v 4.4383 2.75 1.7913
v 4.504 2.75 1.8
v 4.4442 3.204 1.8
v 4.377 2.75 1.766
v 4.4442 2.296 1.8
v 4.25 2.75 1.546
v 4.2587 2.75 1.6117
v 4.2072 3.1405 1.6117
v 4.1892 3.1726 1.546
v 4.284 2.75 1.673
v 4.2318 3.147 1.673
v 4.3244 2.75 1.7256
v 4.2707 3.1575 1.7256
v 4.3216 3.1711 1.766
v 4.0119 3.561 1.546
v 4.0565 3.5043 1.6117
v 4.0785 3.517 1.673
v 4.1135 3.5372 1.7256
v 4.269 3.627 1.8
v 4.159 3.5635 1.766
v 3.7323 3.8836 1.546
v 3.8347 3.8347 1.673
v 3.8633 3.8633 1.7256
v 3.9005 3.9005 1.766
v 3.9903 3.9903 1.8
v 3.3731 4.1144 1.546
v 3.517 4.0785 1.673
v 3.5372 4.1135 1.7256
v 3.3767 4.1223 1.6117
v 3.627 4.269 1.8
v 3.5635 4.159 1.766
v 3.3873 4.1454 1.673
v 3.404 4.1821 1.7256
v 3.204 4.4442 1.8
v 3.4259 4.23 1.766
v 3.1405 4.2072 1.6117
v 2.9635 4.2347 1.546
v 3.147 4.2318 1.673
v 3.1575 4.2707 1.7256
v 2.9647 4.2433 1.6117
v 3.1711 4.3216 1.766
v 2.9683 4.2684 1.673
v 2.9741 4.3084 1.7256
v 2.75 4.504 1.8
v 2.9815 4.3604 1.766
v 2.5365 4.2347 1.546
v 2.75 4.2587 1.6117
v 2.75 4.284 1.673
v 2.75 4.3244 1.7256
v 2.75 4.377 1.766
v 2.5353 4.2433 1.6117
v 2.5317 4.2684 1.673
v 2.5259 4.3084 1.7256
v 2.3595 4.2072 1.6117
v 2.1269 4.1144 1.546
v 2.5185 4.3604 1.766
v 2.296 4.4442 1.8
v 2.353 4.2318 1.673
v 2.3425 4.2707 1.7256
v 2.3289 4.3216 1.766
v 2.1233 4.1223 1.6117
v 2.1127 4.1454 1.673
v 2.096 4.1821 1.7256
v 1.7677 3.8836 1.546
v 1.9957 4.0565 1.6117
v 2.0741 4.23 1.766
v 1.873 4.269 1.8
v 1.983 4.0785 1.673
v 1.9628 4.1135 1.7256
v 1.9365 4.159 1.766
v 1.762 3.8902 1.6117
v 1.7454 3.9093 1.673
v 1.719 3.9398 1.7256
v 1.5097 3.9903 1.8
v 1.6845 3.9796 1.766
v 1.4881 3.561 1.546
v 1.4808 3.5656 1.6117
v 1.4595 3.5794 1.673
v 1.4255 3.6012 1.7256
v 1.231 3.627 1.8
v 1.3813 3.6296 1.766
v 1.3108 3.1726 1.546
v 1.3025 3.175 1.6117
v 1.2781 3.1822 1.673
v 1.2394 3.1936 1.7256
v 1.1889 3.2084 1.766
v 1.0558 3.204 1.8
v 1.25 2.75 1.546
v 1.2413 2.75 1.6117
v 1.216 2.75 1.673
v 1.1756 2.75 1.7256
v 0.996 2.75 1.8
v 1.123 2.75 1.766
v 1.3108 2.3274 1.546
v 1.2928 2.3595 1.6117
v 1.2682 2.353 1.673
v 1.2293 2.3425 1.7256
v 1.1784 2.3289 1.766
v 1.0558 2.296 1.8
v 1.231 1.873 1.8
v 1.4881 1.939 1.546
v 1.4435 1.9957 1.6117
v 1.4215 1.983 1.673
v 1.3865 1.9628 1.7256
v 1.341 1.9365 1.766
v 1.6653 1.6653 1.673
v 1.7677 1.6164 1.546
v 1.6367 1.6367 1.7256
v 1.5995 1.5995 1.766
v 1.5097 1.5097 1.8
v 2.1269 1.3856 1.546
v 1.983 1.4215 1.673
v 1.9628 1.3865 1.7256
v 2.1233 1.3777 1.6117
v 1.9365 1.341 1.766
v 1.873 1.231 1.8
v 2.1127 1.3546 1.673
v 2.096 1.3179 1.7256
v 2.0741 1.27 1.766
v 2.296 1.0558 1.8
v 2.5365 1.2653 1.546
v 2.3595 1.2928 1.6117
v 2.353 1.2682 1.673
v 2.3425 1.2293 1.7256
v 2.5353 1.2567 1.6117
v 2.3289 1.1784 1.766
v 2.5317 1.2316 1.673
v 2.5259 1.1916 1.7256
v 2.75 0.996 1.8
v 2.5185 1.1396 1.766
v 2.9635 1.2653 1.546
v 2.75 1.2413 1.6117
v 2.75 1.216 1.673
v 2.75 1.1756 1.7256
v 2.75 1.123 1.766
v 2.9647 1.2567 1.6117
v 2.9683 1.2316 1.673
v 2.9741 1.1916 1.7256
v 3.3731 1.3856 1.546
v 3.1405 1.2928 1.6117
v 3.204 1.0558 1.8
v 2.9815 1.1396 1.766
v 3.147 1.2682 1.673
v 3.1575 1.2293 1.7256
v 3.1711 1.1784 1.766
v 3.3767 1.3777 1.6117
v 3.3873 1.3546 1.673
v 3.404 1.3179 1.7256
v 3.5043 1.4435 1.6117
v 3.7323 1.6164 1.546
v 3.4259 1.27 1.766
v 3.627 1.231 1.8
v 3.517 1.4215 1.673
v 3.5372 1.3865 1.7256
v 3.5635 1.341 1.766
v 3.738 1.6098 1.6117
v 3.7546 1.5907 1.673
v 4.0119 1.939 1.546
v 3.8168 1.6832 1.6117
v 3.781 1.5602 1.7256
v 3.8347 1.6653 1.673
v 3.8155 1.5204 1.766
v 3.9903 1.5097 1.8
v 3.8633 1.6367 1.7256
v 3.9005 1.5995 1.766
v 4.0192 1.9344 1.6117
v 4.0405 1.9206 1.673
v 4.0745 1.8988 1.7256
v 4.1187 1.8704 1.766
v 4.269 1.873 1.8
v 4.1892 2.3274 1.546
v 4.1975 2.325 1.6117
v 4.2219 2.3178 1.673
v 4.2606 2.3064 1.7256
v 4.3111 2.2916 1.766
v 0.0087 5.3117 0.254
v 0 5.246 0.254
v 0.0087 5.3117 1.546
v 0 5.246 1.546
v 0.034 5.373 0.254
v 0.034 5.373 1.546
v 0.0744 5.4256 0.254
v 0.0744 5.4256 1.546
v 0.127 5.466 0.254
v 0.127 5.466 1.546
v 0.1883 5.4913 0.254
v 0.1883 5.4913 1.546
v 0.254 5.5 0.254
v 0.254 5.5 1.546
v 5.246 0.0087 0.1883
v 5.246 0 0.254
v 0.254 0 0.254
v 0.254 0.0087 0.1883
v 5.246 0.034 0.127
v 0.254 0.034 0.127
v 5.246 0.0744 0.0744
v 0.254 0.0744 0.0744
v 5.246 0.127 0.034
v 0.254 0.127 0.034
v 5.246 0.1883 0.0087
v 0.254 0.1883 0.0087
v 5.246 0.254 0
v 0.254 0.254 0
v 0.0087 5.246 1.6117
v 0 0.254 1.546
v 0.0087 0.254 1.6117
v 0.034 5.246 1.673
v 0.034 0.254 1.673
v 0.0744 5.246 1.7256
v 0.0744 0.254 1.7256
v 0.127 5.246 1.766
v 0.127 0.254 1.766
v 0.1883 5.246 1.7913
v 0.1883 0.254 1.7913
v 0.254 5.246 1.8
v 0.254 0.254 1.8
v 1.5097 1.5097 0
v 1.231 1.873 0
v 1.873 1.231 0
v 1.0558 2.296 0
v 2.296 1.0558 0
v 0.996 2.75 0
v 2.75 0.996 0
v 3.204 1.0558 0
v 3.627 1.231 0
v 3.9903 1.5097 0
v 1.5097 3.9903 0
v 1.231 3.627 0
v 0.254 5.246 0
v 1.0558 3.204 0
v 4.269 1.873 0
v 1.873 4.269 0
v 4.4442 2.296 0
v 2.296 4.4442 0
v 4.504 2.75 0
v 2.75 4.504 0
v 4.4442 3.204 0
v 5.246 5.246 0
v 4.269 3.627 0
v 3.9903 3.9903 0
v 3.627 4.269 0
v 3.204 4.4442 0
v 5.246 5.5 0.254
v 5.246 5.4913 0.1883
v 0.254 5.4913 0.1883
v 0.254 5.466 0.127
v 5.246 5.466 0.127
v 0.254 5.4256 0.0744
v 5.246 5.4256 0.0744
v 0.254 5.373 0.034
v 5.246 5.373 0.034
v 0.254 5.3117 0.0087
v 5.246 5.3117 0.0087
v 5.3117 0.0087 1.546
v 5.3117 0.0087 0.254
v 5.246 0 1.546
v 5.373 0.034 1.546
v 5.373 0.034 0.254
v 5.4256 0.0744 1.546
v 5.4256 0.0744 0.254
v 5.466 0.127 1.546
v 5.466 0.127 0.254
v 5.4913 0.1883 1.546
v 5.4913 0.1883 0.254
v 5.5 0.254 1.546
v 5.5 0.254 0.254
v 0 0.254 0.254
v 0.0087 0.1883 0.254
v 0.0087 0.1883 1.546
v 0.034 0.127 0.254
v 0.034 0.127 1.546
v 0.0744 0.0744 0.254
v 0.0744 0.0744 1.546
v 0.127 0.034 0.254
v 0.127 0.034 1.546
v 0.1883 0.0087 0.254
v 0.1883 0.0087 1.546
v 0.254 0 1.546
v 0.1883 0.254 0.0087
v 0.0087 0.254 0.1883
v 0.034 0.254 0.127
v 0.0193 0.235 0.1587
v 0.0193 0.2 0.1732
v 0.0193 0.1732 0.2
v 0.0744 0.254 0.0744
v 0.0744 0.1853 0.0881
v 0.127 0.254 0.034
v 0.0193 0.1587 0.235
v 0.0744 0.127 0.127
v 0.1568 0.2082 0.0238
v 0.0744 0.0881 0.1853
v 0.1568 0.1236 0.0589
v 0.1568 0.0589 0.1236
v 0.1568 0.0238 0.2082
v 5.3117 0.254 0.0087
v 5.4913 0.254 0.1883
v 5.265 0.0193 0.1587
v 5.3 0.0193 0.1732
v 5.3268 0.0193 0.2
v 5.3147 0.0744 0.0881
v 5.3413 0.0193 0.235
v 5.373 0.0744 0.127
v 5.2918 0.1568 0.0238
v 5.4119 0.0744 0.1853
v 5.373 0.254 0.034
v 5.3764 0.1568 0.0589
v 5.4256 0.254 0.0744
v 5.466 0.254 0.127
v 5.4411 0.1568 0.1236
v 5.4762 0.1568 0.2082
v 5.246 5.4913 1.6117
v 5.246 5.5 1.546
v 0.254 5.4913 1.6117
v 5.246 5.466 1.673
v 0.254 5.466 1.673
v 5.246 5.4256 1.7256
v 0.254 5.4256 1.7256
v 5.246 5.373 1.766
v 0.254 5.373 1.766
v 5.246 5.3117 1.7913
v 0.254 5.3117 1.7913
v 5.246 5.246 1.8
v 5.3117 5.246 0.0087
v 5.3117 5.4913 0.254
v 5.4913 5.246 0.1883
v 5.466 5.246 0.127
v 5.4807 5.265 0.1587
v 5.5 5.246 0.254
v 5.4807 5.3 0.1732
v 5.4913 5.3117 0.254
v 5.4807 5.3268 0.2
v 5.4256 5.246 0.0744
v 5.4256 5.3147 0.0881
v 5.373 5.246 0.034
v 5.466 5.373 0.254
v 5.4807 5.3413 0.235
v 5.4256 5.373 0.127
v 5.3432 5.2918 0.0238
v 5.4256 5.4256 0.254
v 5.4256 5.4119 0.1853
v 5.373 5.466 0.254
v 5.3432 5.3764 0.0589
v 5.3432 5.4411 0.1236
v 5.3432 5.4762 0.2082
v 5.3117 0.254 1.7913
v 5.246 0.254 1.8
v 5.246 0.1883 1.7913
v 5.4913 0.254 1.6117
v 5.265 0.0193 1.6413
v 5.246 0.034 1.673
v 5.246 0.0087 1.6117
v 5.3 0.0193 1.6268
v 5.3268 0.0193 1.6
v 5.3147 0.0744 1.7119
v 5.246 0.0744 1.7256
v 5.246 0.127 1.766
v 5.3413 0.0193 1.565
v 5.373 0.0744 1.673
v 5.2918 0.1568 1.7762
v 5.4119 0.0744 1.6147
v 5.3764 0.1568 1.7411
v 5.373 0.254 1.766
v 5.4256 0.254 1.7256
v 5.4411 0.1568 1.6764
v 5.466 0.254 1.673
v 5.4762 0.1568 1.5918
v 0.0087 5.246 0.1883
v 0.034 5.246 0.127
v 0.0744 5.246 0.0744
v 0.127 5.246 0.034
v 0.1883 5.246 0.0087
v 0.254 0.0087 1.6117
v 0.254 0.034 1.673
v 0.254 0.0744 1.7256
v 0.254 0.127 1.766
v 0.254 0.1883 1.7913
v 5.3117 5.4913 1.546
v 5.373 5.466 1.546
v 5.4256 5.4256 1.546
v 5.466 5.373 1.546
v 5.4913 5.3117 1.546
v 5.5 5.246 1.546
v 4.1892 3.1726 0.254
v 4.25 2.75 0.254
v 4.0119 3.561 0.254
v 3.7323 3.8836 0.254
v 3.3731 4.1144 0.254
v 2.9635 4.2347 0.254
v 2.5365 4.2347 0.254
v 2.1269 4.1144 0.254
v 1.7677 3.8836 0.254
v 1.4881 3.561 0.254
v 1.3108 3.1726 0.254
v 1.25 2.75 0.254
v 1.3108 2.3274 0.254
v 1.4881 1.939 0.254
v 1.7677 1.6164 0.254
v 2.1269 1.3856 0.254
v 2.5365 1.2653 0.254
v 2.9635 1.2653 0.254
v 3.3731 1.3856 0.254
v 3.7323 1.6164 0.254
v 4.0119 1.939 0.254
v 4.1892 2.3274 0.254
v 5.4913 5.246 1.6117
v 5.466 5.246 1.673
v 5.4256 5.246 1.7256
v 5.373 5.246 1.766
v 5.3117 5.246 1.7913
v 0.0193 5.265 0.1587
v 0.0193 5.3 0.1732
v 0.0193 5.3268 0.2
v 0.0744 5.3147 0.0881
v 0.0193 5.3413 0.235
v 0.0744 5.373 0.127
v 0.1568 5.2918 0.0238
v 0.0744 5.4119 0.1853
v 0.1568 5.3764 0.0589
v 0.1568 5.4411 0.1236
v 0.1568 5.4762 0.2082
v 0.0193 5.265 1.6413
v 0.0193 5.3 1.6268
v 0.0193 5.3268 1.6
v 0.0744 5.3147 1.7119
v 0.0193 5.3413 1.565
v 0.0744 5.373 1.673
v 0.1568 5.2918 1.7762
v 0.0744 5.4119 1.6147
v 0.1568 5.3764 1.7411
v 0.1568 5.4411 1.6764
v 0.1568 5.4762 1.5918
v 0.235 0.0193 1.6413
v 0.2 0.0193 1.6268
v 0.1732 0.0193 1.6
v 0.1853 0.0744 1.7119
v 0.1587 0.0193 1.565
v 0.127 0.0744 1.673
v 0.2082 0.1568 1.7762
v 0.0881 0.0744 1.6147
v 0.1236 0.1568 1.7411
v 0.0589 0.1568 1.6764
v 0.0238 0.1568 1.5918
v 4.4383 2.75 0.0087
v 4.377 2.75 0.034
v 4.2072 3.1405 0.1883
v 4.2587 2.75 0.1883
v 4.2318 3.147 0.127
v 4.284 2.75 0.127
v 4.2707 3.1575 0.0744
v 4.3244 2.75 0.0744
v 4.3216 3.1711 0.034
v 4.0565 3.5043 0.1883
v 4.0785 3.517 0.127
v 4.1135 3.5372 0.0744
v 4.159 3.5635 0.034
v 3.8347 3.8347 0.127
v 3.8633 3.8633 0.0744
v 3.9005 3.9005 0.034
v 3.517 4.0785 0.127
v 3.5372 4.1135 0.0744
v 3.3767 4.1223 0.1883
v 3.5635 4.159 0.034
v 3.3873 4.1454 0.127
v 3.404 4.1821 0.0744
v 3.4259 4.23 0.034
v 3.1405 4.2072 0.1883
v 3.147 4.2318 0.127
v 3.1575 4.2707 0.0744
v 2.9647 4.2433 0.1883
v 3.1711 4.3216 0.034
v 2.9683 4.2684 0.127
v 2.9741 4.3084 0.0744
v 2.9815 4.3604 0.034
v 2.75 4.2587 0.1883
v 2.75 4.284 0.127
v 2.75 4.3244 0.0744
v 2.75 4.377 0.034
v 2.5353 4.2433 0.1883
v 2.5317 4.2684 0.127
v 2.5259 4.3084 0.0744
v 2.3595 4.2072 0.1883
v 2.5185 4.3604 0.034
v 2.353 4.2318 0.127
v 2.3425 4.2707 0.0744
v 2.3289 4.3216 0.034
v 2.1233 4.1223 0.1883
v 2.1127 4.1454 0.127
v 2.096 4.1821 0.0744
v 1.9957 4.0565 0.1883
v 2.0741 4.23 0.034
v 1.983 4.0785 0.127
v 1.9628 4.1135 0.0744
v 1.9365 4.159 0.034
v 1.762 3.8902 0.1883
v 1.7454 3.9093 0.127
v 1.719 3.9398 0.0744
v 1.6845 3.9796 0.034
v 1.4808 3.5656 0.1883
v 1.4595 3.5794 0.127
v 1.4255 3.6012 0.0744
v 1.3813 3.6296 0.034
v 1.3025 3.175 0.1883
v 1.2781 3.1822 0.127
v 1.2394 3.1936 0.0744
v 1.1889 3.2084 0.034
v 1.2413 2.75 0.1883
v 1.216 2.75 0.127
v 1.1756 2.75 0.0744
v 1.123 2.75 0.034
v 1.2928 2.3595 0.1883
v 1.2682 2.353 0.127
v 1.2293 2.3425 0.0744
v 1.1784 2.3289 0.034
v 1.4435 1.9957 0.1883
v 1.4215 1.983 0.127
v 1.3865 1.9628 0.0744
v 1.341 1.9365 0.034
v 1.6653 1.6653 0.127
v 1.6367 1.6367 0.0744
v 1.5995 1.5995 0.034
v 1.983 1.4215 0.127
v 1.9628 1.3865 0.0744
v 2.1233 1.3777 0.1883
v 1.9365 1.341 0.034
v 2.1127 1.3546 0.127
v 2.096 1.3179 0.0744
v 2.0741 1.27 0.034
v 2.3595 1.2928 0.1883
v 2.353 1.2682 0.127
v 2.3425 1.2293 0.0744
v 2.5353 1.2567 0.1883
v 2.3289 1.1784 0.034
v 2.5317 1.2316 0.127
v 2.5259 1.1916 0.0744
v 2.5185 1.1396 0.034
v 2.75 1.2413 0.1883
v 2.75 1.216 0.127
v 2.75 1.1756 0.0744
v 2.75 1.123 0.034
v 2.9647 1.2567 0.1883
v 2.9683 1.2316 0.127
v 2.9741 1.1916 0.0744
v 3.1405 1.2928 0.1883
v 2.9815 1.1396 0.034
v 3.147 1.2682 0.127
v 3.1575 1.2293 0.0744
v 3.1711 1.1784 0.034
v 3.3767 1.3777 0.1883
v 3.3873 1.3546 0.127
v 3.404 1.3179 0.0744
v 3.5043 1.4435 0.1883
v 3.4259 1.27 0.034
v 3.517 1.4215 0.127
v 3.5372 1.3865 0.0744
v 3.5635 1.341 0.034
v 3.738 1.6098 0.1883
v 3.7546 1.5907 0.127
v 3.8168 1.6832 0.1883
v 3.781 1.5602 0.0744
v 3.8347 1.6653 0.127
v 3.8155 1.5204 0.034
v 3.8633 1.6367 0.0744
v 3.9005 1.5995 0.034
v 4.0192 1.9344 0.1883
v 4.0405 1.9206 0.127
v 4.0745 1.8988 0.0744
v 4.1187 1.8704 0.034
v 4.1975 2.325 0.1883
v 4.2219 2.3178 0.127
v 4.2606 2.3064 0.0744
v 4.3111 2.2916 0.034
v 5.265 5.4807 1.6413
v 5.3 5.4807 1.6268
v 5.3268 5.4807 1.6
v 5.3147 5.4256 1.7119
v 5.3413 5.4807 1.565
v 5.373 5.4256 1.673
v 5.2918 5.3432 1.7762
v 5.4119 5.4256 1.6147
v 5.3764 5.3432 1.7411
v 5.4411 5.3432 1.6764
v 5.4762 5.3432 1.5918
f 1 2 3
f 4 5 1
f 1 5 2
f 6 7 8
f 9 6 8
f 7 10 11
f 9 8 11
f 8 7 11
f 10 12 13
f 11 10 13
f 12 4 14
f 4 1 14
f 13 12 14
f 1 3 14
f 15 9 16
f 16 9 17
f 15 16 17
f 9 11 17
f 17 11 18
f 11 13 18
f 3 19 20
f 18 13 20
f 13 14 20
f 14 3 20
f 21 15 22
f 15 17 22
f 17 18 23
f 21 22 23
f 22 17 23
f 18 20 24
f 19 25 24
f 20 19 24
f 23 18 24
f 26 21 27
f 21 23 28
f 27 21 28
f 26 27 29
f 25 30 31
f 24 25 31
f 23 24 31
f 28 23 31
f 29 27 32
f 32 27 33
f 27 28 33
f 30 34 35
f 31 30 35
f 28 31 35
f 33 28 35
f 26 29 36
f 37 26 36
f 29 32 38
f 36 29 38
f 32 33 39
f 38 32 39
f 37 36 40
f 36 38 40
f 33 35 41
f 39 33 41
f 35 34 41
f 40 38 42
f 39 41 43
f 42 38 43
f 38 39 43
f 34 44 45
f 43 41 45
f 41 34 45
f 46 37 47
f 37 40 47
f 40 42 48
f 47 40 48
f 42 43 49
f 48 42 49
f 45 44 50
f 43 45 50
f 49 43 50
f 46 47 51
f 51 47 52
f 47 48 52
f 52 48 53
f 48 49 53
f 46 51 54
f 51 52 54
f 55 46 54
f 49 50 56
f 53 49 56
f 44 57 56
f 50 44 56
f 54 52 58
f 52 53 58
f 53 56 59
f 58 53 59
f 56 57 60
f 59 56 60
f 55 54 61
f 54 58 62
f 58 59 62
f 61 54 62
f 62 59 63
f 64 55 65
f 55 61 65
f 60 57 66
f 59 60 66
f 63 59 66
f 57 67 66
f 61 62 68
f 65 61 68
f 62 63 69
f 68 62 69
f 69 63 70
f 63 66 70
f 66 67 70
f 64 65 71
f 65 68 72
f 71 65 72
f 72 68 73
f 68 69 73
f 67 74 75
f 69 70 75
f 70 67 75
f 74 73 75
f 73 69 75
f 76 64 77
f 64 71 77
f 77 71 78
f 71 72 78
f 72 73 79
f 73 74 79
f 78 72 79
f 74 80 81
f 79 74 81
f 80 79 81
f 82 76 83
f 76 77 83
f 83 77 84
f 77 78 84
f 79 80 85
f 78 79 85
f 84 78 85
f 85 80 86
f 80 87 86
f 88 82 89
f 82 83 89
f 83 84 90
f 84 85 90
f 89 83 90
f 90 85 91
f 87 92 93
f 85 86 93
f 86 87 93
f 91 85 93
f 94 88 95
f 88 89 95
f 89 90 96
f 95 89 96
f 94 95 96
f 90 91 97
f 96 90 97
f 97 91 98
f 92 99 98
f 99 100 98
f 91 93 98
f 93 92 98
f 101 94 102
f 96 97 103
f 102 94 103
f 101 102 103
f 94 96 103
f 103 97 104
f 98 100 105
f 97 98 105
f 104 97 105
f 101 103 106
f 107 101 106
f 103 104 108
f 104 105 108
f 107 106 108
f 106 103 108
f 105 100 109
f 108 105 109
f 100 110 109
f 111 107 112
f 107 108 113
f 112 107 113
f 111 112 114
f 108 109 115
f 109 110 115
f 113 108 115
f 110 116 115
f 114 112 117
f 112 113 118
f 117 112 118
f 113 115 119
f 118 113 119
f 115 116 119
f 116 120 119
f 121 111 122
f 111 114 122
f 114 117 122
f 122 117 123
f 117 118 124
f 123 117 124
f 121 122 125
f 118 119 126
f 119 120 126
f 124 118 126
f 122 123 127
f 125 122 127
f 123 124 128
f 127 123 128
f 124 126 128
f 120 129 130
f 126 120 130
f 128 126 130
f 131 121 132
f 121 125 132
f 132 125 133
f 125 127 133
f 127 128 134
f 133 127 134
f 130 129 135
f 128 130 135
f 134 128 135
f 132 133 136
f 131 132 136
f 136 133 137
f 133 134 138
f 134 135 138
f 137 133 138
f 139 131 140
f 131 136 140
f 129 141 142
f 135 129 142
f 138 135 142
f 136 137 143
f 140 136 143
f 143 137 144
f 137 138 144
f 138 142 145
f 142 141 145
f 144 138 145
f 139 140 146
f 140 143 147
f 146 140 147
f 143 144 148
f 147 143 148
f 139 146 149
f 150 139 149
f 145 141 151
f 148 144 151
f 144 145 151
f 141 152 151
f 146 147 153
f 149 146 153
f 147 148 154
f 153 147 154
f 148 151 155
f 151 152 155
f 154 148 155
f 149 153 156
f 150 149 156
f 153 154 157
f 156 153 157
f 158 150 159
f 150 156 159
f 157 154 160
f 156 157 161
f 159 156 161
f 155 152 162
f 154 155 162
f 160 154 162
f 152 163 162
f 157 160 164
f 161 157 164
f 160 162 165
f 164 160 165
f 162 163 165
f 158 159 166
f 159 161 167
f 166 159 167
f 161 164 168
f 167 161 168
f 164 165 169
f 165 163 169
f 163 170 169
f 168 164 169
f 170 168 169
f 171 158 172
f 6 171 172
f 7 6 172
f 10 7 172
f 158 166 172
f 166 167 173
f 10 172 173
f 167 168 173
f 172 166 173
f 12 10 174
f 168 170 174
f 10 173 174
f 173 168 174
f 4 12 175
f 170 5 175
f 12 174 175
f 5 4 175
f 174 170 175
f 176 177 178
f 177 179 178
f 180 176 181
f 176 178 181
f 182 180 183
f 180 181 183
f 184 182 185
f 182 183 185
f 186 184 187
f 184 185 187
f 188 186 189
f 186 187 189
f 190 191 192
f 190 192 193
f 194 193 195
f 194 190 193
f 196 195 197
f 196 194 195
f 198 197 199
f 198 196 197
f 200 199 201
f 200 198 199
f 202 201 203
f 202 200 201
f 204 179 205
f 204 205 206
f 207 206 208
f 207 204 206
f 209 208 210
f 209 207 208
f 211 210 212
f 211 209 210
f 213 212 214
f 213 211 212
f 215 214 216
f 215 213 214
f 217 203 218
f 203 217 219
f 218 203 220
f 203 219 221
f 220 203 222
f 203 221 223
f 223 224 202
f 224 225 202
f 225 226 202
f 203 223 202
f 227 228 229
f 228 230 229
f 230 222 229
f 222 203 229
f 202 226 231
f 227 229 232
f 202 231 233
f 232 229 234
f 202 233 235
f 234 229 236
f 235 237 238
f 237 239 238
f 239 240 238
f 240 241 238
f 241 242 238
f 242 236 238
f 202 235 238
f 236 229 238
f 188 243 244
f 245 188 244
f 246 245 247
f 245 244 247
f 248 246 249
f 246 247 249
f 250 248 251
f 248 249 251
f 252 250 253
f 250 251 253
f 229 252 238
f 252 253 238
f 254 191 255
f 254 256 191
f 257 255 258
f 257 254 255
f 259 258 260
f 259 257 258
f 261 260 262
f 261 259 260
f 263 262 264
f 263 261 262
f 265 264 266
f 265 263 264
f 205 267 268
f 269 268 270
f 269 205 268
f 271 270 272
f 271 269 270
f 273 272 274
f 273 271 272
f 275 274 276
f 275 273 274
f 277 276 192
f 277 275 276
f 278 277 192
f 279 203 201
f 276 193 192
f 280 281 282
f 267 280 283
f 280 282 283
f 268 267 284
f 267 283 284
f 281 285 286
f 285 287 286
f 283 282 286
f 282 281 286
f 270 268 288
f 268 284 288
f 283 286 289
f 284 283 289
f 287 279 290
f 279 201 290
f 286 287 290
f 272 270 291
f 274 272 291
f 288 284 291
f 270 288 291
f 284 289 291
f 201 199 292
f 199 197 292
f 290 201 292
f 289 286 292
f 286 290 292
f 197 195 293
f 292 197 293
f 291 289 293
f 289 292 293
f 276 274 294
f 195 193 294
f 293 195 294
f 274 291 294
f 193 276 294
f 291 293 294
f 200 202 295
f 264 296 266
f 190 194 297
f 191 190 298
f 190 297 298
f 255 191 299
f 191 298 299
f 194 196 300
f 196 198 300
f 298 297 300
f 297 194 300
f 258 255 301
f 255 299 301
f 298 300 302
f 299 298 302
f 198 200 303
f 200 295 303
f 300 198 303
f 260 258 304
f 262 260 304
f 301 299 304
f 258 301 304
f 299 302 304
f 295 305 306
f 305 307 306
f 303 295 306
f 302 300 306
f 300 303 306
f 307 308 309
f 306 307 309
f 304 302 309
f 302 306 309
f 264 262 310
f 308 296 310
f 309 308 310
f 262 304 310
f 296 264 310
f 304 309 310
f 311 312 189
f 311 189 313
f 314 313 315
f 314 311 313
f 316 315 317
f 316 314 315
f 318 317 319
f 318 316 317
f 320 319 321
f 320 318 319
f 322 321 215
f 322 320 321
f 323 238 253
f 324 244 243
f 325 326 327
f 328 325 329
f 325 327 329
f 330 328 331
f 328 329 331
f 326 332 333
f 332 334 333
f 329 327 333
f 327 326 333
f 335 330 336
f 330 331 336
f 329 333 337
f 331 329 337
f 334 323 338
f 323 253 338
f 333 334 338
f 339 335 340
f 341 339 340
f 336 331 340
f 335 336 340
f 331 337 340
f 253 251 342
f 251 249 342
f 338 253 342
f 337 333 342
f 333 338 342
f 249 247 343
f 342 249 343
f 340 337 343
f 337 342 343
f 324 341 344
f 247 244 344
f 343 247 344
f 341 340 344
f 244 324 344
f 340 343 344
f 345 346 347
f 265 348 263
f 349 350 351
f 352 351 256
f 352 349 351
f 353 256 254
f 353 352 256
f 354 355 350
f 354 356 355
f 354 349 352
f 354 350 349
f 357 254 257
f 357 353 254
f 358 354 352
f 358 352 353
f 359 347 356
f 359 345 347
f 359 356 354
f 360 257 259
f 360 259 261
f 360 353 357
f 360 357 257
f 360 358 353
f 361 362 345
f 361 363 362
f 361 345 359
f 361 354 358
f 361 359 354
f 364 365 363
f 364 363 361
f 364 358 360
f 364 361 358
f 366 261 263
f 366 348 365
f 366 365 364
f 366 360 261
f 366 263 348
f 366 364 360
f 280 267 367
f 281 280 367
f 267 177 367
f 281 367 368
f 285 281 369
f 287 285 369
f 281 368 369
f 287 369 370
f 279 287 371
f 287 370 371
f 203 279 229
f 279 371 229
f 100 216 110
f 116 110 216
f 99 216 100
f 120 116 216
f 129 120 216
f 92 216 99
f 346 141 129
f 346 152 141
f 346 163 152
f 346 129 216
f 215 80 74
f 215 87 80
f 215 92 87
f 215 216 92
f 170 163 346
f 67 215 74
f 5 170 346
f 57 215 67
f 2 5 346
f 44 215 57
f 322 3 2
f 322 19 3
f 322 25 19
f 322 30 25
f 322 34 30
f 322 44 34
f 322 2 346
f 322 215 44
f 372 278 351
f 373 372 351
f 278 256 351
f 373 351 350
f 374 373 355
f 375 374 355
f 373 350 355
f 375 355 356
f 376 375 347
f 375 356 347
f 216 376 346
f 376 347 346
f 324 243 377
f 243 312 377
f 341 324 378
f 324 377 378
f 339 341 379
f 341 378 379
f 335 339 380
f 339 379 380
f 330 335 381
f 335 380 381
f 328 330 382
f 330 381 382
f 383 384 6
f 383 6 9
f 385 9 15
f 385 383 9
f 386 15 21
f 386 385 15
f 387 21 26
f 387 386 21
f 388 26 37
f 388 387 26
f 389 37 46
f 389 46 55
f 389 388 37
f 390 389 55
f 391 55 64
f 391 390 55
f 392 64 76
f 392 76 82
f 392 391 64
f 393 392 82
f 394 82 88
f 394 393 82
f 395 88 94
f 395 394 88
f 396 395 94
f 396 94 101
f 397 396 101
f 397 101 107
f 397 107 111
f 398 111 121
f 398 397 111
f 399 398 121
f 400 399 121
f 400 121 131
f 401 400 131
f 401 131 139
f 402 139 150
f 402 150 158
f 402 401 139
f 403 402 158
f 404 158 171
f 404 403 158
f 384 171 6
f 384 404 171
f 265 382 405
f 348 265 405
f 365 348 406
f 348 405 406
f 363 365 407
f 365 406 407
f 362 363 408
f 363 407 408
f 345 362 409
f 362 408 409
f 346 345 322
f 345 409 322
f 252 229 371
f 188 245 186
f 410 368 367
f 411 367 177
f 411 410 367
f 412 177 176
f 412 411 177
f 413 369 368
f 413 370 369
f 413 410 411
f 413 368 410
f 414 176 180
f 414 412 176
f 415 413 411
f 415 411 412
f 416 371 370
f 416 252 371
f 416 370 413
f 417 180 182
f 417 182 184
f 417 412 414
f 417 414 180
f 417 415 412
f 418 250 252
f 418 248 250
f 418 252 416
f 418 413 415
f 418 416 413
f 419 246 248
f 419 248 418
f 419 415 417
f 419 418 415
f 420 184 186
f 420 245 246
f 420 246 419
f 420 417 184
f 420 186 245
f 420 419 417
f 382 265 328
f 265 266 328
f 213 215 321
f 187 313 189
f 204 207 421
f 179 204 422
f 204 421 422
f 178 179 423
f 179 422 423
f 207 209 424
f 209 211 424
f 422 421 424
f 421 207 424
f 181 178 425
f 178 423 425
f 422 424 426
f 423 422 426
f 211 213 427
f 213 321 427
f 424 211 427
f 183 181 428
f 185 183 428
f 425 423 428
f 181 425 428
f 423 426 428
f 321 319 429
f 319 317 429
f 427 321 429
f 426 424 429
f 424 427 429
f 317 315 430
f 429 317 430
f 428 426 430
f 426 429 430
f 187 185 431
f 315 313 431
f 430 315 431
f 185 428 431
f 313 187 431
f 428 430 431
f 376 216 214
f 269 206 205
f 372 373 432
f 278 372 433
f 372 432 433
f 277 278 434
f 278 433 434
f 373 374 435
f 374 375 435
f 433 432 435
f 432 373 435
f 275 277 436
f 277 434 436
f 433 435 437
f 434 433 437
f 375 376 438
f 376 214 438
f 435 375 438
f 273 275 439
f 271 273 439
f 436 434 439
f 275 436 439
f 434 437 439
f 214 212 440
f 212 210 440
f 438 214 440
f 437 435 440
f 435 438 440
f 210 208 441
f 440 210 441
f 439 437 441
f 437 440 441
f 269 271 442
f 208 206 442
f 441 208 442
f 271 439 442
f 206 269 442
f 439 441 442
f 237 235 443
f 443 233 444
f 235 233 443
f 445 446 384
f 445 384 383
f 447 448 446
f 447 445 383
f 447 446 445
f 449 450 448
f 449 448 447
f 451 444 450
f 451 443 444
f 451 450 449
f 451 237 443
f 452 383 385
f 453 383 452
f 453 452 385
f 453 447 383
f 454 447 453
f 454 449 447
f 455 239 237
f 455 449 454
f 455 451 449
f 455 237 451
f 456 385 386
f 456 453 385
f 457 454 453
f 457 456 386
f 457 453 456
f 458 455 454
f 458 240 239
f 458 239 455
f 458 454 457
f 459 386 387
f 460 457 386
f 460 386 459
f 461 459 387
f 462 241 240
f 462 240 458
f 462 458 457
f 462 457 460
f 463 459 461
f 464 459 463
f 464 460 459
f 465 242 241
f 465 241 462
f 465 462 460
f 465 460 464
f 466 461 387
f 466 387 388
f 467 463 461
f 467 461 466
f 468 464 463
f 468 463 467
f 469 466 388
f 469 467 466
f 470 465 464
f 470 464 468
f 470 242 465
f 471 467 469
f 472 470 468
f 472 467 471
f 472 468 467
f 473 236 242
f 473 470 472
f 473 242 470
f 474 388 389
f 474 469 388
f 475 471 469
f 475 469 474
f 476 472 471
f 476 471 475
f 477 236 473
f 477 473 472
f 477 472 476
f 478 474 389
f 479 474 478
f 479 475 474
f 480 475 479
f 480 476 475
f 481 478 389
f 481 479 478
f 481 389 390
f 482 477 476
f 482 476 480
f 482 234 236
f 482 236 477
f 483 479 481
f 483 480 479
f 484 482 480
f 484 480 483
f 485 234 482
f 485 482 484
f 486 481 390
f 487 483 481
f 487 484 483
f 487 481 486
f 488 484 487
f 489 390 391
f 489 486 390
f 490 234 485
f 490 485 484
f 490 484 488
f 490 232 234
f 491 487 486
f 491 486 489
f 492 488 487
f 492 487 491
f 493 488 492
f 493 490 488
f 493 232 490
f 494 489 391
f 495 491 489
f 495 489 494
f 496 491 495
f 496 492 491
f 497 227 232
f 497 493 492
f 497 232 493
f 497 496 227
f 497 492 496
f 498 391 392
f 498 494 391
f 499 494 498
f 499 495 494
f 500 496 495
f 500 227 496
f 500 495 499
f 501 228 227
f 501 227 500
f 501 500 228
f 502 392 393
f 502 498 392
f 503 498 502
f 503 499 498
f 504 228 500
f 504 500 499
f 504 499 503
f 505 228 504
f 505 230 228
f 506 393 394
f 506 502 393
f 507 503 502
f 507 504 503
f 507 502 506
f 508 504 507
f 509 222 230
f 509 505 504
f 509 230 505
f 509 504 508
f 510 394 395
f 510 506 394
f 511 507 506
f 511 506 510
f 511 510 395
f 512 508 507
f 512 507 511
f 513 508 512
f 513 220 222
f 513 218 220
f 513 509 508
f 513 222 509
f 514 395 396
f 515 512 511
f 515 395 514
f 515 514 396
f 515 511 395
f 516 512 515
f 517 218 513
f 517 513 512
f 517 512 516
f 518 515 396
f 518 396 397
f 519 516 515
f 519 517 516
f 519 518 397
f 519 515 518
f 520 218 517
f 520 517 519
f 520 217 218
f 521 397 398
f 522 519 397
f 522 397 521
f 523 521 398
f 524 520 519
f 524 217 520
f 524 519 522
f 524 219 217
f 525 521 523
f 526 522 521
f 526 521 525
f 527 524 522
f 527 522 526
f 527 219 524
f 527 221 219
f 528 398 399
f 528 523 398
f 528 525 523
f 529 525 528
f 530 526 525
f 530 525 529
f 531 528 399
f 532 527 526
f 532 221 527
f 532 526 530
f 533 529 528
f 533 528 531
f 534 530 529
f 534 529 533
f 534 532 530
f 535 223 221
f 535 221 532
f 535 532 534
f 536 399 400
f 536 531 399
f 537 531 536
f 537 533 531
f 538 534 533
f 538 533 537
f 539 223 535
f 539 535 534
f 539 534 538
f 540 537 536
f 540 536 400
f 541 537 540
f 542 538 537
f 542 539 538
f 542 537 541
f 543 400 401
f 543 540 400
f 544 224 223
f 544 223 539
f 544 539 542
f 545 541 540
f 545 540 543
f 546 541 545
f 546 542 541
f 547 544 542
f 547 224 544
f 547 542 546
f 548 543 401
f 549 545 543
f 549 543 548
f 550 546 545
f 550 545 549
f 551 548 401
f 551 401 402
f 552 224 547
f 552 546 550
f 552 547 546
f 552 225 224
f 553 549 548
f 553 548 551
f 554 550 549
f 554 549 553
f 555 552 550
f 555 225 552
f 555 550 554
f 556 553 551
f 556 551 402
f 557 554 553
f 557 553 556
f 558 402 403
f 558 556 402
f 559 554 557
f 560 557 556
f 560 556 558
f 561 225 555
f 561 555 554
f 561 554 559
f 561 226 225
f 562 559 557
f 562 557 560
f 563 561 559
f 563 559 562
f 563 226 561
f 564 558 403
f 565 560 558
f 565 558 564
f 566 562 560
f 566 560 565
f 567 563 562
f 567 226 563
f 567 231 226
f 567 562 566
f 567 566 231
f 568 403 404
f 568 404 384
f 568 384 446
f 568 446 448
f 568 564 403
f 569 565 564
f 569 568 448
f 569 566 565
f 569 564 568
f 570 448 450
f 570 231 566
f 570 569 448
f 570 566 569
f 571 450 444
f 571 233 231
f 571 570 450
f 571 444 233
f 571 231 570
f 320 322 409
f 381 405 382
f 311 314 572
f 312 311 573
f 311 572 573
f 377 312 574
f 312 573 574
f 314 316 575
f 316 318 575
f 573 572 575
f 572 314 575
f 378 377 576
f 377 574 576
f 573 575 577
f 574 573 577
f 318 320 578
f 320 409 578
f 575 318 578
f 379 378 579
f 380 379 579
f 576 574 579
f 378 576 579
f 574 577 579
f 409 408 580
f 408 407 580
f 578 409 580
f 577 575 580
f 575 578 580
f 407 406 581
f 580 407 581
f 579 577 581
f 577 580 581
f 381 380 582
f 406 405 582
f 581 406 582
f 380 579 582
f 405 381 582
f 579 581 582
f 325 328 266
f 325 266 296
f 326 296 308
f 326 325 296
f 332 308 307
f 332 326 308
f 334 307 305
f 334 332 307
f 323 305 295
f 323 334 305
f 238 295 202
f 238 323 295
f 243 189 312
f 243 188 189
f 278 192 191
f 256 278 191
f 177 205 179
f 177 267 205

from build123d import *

# Parameters (mm, degrees)
SKETCH1_W           = 5.5
SKETCH1_H           = 5.5
SKETCH1_R           = 1.5
BOSS_EXTRUDE1_DEPTH = 1.8
FILLET1_R           = 0.254


with BuildPart() as part:
    # Sketch1 → Boss-Extrude1 (new body)
    with BuildSketch(Plane.XY):
        with Locations((2.75, 2.75)):
            Rectangle(SKETCH1_W, SKETCH1_H)
        with Locations((2.75, 2.75)):
            Circle(SKETCH1_R, mode=Mode.SUBTRACT)
    extrude(amount=BOSS_EXTRUDE1_DEPTH)

    # Fillet1
    fillet1_edges = [part.edges().sort_by_distance(p)[0] for p in [
        (5.5, 2.75, 1.8),
        (1.25, 2.75, 0),
        (1.25, 2.75, 1.8),
        (2.75, 5.5, 1.8),
        (0, 2.75, 1.8),
        (2.75, 5.5, 0),
        (5.5, 2.75, 0),
        (2.75, 0, 0),
        (0, 2.75, 0),
        (2.75, 0, 1.8),
        (0, 5.5, 0.9),
        (5.5, 5.5, 0.9),
        (5.5, 0, 0.9),
        (0, 0, 0.9),
    ]]
    fillet(fillet1_edges, radius=FILLET1_R)


solid = part.part
